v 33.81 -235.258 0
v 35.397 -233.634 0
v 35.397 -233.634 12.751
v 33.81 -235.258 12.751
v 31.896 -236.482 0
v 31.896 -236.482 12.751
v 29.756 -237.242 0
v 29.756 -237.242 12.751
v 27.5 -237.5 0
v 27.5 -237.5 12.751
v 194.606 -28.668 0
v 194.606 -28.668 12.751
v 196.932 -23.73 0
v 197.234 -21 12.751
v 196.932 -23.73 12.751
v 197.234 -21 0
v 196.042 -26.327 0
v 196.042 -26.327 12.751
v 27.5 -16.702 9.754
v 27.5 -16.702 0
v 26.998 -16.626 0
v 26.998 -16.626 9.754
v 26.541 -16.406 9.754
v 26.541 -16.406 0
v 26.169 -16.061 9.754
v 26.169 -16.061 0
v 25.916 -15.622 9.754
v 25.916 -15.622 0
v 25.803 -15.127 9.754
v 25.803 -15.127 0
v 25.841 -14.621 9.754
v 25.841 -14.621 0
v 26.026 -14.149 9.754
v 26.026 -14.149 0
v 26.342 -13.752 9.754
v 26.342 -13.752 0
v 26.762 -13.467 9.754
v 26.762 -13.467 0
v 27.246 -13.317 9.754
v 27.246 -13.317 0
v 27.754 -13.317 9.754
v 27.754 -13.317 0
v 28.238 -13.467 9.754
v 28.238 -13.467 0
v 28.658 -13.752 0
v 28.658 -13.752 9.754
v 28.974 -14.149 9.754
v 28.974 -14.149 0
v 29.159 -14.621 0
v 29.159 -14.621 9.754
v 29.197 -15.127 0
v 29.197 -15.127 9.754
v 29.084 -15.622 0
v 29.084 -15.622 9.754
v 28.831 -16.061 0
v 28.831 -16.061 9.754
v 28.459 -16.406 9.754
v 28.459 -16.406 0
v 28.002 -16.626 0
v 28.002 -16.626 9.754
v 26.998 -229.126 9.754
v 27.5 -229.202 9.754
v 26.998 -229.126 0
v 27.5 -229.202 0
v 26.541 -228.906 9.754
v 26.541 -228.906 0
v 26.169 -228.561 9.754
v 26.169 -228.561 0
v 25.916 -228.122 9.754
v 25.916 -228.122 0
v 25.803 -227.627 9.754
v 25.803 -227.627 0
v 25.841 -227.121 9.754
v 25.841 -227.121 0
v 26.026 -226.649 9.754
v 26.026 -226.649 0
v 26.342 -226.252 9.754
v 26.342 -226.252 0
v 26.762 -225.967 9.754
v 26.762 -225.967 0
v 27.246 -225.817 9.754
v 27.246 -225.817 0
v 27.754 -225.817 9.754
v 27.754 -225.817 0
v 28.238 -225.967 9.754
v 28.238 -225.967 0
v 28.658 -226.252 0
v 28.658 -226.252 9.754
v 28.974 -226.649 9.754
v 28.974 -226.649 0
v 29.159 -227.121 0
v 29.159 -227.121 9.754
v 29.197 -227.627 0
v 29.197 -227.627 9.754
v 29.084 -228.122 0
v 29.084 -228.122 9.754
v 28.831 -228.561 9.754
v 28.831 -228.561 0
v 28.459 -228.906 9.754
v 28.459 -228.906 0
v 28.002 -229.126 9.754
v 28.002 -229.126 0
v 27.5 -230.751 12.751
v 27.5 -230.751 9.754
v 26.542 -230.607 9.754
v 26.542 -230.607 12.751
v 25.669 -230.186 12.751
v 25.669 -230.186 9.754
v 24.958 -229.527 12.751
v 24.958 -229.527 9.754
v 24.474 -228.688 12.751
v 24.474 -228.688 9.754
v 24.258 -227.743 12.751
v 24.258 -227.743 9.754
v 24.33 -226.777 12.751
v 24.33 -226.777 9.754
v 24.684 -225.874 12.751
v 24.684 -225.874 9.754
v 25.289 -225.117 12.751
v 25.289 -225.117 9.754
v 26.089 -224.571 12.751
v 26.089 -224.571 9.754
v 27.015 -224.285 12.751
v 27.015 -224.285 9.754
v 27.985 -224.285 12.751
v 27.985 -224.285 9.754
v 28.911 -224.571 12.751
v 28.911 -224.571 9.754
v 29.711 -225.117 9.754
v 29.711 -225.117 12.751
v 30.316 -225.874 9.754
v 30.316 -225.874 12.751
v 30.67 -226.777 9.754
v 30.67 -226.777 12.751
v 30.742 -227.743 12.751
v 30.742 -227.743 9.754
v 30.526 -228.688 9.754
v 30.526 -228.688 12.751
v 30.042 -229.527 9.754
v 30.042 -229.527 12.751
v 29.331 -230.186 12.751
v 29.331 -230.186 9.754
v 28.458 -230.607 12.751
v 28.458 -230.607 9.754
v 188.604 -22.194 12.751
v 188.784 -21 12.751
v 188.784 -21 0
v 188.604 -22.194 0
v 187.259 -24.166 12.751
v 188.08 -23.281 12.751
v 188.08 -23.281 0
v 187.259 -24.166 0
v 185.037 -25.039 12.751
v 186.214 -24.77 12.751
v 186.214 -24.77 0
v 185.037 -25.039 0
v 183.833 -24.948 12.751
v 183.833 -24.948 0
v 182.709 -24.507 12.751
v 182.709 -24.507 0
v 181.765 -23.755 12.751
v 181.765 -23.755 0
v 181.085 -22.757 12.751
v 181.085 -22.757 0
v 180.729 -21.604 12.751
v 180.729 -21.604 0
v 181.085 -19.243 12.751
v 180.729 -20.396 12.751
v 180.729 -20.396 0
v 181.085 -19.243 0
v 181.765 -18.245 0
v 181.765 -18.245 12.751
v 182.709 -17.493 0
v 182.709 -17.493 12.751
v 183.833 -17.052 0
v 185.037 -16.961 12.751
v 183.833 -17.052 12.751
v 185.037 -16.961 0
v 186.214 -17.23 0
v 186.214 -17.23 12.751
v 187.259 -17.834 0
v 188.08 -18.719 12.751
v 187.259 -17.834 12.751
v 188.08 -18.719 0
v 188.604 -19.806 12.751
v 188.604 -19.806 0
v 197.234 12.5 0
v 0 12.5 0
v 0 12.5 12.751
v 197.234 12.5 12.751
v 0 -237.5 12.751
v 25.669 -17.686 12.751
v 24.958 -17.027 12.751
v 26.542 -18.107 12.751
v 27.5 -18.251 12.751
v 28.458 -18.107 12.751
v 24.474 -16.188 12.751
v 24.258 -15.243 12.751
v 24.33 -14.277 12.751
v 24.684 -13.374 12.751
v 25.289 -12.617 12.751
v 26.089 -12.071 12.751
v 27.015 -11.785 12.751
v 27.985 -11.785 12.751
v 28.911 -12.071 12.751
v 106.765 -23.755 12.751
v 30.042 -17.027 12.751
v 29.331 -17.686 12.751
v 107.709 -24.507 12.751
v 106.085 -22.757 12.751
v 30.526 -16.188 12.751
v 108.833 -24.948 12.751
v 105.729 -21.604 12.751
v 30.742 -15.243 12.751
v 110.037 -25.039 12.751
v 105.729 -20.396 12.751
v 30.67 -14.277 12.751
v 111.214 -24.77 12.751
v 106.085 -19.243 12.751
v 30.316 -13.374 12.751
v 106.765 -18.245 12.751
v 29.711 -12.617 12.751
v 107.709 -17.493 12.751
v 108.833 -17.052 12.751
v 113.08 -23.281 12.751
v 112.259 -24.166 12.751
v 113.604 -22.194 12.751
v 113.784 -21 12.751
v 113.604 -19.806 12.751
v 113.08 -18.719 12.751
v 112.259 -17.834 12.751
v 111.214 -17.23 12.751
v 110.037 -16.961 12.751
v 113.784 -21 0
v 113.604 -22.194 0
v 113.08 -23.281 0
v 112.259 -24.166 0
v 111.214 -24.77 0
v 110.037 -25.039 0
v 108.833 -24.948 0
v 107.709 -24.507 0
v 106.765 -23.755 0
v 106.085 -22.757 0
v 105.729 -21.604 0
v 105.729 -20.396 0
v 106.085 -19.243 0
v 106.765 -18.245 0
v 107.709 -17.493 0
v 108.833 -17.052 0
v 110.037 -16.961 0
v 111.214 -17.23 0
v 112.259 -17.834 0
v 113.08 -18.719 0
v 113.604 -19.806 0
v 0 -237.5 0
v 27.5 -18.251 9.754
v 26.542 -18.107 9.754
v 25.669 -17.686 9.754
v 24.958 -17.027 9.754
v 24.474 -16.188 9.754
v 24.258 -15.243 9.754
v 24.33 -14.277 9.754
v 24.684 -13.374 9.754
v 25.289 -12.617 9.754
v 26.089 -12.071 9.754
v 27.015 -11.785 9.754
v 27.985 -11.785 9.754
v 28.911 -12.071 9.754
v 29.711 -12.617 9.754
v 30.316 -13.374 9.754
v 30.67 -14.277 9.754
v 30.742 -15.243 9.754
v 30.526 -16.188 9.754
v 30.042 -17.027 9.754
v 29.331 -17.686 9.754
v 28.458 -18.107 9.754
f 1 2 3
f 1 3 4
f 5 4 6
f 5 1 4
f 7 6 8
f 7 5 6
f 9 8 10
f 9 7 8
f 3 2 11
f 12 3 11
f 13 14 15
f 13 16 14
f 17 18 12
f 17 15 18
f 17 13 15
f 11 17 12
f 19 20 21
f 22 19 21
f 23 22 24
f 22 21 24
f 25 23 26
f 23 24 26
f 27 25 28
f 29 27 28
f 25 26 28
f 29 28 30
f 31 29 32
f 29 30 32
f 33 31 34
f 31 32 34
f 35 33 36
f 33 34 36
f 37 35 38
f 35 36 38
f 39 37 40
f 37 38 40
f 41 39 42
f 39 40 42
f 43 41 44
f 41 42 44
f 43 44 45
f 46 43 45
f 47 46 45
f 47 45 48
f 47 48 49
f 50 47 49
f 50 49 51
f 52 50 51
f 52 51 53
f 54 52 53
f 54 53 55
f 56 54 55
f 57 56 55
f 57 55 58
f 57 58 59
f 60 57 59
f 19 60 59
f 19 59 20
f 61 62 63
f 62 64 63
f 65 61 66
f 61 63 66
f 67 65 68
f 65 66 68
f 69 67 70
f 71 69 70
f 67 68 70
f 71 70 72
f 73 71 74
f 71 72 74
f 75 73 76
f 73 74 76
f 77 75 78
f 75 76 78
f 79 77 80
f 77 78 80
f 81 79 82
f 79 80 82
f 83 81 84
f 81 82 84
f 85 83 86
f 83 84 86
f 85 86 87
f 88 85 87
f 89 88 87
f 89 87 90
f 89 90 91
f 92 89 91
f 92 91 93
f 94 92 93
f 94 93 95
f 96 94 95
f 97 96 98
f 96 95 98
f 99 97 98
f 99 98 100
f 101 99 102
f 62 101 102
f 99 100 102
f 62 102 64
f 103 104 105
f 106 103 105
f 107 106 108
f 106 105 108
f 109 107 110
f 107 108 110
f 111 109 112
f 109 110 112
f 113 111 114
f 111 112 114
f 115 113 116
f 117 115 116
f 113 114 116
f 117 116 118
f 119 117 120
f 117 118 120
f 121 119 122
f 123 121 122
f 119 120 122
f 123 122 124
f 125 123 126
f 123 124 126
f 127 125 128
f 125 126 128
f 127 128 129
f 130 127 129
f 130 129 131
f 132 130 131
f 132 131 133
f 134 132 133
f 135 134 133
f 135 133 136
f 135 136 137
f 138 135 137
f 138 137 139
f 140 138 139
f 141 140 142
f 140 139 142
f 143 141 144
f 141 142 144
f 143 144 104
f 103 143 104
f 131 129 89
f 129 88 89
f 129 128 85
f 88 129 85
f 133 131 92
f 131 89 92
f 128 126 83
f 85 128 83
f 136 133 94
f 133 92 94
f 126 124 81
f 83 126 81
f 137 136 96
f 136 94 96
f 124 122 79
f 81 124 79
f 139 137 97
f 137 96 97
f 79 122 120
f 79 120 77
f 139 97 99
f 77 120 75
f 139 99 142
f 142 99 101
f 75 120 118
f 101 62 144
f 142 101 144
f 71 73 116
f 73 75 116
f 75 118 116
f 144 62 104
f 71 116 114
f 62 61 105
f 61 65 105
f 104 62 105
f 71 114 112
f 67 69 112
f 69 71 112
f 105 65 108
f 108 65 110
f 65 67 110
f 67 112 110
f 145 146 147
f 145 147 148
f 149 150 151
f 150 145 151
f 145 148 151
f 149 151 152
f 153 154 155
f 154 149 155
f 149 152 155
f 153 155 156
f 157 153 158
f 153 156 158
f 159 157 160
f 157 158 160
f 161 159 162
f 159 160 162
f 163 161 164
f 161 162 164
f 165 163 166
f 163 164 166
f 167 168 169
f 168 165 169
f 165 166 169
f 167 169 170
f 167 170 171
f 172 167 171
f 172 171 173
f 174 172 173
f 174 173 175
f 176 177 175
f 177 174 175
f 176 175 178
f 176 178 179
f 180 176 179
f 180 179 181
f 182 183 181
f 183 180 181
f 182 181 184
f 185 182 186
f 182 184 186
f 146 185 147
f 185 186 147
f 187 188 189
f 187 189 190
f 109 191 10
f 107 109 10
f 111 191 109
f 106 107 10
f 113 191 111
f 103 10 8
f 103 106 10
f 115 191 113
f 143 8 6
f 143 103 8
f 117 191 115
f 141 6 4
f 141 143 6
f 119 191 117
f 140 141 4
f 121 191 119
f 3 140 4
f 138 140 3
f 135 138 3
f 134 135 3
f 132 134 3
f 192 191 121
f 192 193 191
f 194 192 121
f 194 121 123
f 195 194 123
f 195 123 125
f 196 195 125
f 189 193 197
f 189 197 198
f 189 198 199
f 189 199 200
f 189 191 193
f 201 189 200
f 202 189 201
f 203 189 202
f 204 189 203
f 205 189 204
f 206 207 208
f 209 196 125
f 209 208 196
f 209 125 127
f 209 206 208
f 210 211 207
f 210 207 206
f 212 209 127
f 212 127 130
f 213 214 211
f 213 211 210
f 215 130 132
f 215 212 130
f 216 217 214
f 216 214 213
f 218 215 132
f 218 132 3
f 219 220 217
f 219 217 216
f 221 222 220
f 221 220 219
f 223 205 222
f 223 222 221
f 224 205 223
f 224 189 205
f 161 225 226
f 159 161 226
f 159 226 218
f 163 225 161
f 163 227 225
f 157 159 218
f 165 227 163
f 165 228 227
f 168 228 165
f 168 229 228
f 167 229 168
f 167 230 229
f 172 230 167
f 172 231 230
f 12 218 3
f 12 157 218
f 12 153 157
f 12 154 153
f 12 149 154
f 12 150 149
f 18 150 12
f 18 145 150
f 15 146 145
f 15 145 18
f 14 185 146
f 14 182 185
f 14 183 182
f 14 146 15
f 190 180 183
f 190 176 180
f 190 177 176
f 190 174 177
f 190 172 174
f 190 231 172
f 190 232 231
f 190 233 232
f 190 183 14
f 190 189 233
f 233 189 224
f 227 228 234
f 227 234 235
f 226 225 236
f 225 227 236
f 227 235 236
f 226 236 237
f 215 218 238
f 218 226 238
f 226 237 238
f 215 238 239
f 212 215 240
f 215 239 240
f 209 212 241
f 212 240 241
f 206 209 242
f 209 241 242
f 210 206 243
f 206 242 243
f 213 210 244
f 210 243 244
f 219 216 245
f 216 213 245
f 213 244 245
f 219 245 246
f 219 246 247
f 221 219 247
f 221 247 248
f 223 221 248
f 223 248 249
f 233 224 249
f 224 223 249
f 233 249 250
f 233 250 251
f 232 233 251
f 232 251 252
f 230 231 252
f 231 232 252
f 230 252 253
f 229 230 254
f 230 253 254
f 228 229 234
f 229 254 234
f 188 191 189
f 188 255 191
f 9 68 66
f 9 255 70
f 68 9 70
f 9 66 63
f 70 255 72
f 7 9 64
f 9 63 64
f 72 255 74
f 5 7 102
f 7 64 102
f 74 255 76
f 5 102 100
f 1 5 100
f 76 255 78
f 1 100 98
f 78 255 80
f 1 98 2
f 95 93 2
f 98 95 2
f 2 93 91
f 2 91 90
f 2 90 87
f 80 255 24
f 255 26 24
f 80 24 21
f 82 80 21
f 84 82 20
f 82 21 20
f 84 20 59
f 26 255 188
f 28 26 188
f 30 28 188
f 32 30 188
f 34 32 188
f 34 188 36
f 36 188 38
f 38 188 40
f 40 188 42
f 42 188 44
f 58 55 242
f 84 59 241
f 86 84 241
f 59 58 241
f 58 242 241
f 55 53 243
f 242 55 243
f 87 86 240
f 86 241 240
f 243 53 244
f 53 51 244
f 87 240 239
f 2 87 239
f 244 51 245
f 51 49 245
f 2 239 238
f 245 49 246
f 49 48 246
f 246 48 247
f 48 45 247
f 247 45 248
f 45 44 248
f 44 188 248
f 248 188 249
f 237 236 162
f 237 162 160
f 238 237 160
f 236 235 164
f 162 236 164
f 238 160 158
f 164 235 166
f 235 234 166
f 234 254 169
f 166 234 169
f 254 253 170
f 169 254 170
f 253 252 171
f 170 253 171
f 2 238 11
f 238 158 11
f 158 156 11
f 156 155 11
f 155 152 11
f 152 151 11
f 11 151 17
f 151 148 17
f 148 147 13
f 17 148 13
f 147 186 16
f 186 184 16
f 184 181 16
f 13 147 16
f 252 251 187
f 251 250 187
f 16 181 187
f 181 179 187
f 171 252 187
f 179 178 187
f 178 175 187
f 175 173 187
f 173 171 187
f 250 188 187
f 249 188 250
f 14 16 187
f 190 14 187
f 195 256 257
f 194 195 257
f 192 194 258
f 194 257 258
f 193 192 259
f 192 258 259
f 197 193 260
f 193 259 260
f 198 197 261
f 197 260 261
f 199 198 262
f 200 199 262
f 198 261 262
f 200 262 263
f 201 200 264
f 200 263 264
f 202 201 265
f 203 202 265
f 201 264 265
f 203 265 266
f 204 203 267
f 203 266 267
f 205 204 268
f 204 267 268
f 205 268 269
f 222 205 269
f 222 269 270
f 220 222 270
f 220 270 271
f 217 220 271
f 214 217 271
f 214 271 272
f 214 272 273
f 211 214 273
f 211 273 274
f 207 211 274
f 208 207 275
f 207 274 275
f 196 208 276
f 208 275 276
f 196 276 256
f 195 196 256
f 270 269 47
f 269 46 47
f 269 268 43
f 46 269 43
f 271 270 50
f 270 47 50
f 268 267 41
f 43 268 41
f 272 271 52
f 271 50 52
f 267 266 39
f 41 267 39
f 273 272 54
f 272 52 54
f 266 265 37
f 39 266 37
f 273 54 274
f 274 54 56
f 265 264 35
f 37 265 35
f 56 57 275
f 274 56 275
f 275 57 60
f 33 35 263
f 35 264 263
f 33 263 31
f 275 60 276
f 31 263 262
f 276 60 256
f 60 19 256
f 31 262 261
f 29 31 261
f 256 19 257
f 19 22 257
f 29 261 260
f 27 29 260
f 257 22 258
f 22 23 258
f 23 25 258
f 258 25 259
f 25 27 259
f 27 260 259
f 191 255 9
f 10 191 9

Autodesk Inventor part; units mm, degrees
ref_plane "YZ Plane" through (0, 0, 0) normal (1, 0, 0) x (0, 1, 0)
ref_plane "XZ Plane" through (0, 0, 0) normal (0, 1, 0) x (-1, 0, 0)
ref_plane "XY Plane" through (0, 0, 0) normal (0, 0, 1) x (1, 0, 0)
ref_plane "Work Plane1" through (0, 142.0555, 0) normal (0, 0, 1) x (1, 0, 0)
sketch "Sketch1" plane through (0, 142.0555, 0) normal (0, 0, 1) x (1, 0, 0)
  line L0 (450, -129.5555) -> (450, -142.0555) projected
  line L1 (0, -129.5555) -> (450, -129.5555) projected
  line L2 (0, -142.0555) -> (0, -129.5555) projected
  line L3 (450, -142.0555) -> (0, -142.0555) projected
  circle A0 centre (109.7339, -163.0555) radius 4.05 projected
  circle A1 centre (184.7339, -163.0555) radius 4.05 projected
  line L4 (92.2339, -147.0555) -> (92.2339, -142.0555) projected
  arc A2 (97.2339, -152.0555) -> (92.2339, -147.0555) centre (92.2339, -152.0555) ccw projected
  line L5 (97.2339, -152.0555) -> (97.2339, -163.0555) projected
  arc A3 (97.2339, -163.0555) -> (122.2339, -163.0555) centre (109.7339, -163.0555) ccw projected
  line L6 (122.2339, -163.0555) -> (122.2339, -152.0555) projected
  arc A4 (127.2339, -147.0555) -> (122.2339, -152.0555) centre (127.2339, -152.0555) ccw projected
  line L7 (127.2339, -147.0555) -> (167.2339, -147.0555) projected
  arc A5 (172.2339, -152.0555) -> (167.2339, -147.0555) centre (167.2339, -152.0555) ccw projected
  line L8 (172.2339, -152.0555) -> (172.2339, -163.0555) projected
  arc A6 (172.2339, -163.0555) -> (197.2339, -163.0555) centre (184.7339, -163.0555) ccw projected
  line L9 (197.2339, -163.0555) -> (197.2339, -152.0555) projected
  arc A7 (202.2339, -147.0555) -> (197.2339, -152.0555) centre (202.2339, -152.0555) ccw projected
  line L10 (202.2339, -142.0555) -> (202.2339, -147.0555) projected
  line L11 (92.2339, -142.0555) -> (202.2339, -142.0555) projected
  line L12 (0, -129.5555) -> (0, -379.5555)
  line L13 (0, -379.5555) -> (27.5, -379.5555)
  line L14 (35.3974, -375.6899) -> (194.6057, -170.7235)
  line L15 (197.2339, -163.0555) -> (197.2339, -129.5555)
  line L16 (0, -129.5555) -> (197.2339, -129.5555)
  arc A8 (194.6057, -170.7235) -> (197.2339, -163.0555) centre (184.7339, -163.0555) ccw
  arc A9 (27.5, -379.5555) -> (35.3974, -375.6899) centre (27.5, -369.5555) ccw
  dimension "d2" = 250
  dimension "d5" = 20
  dimension "d6" = 27.5
extrude "Extrusion1" add sketch "Sketch1" along normal blind 12.7508 contours L15 L3 L2 L1 | L15 L9 A6 L8 A5 L7 A4 L6 A3 L5 A2 L4 L3 | L3 L4 A2 L5 A3 L6 A4 L7 A5 L8 A6 L14 A9 L13 L12
sketch "Sketch2" plane through (0, 142.0555, 0) normal (0, 0, -1) x (-1, 0, 0)
  circle A0 centre (-27.5, -369.5555) radius 1.55
  circle A1 centre (-27.5, -157.0555) radius 1.55
  point P0 (0, -142.0555)
extrude "Extrusion2" cut sketch "Sketch2" against normal through all
sketch "Sketch3" plane through (0, 142.0555, 12.7508) normal (0, 0, 1) x (1, 0, 0)
  circle A0 centre (27.5, -157.0555) radius 1.55 projected
  arc A1 (27.5, -379.5555) -> (35.3974, -375.6899) centre (27.5, -369.5555) ccw projected
  point P0 (0, -142.0555)
hole "Hole1" at (27.5, -15, 12.7508) at (27.5, -227.5, 12.7508) direction (0, 0, -1) diameter 3.4036 end through all counterbore diameter 6.5024 counterbore depth 2.9972 clearance for "Socket Head Cap Screw" size "M3" standard "Ansi Metric M Profile"
properties part number "side support"
